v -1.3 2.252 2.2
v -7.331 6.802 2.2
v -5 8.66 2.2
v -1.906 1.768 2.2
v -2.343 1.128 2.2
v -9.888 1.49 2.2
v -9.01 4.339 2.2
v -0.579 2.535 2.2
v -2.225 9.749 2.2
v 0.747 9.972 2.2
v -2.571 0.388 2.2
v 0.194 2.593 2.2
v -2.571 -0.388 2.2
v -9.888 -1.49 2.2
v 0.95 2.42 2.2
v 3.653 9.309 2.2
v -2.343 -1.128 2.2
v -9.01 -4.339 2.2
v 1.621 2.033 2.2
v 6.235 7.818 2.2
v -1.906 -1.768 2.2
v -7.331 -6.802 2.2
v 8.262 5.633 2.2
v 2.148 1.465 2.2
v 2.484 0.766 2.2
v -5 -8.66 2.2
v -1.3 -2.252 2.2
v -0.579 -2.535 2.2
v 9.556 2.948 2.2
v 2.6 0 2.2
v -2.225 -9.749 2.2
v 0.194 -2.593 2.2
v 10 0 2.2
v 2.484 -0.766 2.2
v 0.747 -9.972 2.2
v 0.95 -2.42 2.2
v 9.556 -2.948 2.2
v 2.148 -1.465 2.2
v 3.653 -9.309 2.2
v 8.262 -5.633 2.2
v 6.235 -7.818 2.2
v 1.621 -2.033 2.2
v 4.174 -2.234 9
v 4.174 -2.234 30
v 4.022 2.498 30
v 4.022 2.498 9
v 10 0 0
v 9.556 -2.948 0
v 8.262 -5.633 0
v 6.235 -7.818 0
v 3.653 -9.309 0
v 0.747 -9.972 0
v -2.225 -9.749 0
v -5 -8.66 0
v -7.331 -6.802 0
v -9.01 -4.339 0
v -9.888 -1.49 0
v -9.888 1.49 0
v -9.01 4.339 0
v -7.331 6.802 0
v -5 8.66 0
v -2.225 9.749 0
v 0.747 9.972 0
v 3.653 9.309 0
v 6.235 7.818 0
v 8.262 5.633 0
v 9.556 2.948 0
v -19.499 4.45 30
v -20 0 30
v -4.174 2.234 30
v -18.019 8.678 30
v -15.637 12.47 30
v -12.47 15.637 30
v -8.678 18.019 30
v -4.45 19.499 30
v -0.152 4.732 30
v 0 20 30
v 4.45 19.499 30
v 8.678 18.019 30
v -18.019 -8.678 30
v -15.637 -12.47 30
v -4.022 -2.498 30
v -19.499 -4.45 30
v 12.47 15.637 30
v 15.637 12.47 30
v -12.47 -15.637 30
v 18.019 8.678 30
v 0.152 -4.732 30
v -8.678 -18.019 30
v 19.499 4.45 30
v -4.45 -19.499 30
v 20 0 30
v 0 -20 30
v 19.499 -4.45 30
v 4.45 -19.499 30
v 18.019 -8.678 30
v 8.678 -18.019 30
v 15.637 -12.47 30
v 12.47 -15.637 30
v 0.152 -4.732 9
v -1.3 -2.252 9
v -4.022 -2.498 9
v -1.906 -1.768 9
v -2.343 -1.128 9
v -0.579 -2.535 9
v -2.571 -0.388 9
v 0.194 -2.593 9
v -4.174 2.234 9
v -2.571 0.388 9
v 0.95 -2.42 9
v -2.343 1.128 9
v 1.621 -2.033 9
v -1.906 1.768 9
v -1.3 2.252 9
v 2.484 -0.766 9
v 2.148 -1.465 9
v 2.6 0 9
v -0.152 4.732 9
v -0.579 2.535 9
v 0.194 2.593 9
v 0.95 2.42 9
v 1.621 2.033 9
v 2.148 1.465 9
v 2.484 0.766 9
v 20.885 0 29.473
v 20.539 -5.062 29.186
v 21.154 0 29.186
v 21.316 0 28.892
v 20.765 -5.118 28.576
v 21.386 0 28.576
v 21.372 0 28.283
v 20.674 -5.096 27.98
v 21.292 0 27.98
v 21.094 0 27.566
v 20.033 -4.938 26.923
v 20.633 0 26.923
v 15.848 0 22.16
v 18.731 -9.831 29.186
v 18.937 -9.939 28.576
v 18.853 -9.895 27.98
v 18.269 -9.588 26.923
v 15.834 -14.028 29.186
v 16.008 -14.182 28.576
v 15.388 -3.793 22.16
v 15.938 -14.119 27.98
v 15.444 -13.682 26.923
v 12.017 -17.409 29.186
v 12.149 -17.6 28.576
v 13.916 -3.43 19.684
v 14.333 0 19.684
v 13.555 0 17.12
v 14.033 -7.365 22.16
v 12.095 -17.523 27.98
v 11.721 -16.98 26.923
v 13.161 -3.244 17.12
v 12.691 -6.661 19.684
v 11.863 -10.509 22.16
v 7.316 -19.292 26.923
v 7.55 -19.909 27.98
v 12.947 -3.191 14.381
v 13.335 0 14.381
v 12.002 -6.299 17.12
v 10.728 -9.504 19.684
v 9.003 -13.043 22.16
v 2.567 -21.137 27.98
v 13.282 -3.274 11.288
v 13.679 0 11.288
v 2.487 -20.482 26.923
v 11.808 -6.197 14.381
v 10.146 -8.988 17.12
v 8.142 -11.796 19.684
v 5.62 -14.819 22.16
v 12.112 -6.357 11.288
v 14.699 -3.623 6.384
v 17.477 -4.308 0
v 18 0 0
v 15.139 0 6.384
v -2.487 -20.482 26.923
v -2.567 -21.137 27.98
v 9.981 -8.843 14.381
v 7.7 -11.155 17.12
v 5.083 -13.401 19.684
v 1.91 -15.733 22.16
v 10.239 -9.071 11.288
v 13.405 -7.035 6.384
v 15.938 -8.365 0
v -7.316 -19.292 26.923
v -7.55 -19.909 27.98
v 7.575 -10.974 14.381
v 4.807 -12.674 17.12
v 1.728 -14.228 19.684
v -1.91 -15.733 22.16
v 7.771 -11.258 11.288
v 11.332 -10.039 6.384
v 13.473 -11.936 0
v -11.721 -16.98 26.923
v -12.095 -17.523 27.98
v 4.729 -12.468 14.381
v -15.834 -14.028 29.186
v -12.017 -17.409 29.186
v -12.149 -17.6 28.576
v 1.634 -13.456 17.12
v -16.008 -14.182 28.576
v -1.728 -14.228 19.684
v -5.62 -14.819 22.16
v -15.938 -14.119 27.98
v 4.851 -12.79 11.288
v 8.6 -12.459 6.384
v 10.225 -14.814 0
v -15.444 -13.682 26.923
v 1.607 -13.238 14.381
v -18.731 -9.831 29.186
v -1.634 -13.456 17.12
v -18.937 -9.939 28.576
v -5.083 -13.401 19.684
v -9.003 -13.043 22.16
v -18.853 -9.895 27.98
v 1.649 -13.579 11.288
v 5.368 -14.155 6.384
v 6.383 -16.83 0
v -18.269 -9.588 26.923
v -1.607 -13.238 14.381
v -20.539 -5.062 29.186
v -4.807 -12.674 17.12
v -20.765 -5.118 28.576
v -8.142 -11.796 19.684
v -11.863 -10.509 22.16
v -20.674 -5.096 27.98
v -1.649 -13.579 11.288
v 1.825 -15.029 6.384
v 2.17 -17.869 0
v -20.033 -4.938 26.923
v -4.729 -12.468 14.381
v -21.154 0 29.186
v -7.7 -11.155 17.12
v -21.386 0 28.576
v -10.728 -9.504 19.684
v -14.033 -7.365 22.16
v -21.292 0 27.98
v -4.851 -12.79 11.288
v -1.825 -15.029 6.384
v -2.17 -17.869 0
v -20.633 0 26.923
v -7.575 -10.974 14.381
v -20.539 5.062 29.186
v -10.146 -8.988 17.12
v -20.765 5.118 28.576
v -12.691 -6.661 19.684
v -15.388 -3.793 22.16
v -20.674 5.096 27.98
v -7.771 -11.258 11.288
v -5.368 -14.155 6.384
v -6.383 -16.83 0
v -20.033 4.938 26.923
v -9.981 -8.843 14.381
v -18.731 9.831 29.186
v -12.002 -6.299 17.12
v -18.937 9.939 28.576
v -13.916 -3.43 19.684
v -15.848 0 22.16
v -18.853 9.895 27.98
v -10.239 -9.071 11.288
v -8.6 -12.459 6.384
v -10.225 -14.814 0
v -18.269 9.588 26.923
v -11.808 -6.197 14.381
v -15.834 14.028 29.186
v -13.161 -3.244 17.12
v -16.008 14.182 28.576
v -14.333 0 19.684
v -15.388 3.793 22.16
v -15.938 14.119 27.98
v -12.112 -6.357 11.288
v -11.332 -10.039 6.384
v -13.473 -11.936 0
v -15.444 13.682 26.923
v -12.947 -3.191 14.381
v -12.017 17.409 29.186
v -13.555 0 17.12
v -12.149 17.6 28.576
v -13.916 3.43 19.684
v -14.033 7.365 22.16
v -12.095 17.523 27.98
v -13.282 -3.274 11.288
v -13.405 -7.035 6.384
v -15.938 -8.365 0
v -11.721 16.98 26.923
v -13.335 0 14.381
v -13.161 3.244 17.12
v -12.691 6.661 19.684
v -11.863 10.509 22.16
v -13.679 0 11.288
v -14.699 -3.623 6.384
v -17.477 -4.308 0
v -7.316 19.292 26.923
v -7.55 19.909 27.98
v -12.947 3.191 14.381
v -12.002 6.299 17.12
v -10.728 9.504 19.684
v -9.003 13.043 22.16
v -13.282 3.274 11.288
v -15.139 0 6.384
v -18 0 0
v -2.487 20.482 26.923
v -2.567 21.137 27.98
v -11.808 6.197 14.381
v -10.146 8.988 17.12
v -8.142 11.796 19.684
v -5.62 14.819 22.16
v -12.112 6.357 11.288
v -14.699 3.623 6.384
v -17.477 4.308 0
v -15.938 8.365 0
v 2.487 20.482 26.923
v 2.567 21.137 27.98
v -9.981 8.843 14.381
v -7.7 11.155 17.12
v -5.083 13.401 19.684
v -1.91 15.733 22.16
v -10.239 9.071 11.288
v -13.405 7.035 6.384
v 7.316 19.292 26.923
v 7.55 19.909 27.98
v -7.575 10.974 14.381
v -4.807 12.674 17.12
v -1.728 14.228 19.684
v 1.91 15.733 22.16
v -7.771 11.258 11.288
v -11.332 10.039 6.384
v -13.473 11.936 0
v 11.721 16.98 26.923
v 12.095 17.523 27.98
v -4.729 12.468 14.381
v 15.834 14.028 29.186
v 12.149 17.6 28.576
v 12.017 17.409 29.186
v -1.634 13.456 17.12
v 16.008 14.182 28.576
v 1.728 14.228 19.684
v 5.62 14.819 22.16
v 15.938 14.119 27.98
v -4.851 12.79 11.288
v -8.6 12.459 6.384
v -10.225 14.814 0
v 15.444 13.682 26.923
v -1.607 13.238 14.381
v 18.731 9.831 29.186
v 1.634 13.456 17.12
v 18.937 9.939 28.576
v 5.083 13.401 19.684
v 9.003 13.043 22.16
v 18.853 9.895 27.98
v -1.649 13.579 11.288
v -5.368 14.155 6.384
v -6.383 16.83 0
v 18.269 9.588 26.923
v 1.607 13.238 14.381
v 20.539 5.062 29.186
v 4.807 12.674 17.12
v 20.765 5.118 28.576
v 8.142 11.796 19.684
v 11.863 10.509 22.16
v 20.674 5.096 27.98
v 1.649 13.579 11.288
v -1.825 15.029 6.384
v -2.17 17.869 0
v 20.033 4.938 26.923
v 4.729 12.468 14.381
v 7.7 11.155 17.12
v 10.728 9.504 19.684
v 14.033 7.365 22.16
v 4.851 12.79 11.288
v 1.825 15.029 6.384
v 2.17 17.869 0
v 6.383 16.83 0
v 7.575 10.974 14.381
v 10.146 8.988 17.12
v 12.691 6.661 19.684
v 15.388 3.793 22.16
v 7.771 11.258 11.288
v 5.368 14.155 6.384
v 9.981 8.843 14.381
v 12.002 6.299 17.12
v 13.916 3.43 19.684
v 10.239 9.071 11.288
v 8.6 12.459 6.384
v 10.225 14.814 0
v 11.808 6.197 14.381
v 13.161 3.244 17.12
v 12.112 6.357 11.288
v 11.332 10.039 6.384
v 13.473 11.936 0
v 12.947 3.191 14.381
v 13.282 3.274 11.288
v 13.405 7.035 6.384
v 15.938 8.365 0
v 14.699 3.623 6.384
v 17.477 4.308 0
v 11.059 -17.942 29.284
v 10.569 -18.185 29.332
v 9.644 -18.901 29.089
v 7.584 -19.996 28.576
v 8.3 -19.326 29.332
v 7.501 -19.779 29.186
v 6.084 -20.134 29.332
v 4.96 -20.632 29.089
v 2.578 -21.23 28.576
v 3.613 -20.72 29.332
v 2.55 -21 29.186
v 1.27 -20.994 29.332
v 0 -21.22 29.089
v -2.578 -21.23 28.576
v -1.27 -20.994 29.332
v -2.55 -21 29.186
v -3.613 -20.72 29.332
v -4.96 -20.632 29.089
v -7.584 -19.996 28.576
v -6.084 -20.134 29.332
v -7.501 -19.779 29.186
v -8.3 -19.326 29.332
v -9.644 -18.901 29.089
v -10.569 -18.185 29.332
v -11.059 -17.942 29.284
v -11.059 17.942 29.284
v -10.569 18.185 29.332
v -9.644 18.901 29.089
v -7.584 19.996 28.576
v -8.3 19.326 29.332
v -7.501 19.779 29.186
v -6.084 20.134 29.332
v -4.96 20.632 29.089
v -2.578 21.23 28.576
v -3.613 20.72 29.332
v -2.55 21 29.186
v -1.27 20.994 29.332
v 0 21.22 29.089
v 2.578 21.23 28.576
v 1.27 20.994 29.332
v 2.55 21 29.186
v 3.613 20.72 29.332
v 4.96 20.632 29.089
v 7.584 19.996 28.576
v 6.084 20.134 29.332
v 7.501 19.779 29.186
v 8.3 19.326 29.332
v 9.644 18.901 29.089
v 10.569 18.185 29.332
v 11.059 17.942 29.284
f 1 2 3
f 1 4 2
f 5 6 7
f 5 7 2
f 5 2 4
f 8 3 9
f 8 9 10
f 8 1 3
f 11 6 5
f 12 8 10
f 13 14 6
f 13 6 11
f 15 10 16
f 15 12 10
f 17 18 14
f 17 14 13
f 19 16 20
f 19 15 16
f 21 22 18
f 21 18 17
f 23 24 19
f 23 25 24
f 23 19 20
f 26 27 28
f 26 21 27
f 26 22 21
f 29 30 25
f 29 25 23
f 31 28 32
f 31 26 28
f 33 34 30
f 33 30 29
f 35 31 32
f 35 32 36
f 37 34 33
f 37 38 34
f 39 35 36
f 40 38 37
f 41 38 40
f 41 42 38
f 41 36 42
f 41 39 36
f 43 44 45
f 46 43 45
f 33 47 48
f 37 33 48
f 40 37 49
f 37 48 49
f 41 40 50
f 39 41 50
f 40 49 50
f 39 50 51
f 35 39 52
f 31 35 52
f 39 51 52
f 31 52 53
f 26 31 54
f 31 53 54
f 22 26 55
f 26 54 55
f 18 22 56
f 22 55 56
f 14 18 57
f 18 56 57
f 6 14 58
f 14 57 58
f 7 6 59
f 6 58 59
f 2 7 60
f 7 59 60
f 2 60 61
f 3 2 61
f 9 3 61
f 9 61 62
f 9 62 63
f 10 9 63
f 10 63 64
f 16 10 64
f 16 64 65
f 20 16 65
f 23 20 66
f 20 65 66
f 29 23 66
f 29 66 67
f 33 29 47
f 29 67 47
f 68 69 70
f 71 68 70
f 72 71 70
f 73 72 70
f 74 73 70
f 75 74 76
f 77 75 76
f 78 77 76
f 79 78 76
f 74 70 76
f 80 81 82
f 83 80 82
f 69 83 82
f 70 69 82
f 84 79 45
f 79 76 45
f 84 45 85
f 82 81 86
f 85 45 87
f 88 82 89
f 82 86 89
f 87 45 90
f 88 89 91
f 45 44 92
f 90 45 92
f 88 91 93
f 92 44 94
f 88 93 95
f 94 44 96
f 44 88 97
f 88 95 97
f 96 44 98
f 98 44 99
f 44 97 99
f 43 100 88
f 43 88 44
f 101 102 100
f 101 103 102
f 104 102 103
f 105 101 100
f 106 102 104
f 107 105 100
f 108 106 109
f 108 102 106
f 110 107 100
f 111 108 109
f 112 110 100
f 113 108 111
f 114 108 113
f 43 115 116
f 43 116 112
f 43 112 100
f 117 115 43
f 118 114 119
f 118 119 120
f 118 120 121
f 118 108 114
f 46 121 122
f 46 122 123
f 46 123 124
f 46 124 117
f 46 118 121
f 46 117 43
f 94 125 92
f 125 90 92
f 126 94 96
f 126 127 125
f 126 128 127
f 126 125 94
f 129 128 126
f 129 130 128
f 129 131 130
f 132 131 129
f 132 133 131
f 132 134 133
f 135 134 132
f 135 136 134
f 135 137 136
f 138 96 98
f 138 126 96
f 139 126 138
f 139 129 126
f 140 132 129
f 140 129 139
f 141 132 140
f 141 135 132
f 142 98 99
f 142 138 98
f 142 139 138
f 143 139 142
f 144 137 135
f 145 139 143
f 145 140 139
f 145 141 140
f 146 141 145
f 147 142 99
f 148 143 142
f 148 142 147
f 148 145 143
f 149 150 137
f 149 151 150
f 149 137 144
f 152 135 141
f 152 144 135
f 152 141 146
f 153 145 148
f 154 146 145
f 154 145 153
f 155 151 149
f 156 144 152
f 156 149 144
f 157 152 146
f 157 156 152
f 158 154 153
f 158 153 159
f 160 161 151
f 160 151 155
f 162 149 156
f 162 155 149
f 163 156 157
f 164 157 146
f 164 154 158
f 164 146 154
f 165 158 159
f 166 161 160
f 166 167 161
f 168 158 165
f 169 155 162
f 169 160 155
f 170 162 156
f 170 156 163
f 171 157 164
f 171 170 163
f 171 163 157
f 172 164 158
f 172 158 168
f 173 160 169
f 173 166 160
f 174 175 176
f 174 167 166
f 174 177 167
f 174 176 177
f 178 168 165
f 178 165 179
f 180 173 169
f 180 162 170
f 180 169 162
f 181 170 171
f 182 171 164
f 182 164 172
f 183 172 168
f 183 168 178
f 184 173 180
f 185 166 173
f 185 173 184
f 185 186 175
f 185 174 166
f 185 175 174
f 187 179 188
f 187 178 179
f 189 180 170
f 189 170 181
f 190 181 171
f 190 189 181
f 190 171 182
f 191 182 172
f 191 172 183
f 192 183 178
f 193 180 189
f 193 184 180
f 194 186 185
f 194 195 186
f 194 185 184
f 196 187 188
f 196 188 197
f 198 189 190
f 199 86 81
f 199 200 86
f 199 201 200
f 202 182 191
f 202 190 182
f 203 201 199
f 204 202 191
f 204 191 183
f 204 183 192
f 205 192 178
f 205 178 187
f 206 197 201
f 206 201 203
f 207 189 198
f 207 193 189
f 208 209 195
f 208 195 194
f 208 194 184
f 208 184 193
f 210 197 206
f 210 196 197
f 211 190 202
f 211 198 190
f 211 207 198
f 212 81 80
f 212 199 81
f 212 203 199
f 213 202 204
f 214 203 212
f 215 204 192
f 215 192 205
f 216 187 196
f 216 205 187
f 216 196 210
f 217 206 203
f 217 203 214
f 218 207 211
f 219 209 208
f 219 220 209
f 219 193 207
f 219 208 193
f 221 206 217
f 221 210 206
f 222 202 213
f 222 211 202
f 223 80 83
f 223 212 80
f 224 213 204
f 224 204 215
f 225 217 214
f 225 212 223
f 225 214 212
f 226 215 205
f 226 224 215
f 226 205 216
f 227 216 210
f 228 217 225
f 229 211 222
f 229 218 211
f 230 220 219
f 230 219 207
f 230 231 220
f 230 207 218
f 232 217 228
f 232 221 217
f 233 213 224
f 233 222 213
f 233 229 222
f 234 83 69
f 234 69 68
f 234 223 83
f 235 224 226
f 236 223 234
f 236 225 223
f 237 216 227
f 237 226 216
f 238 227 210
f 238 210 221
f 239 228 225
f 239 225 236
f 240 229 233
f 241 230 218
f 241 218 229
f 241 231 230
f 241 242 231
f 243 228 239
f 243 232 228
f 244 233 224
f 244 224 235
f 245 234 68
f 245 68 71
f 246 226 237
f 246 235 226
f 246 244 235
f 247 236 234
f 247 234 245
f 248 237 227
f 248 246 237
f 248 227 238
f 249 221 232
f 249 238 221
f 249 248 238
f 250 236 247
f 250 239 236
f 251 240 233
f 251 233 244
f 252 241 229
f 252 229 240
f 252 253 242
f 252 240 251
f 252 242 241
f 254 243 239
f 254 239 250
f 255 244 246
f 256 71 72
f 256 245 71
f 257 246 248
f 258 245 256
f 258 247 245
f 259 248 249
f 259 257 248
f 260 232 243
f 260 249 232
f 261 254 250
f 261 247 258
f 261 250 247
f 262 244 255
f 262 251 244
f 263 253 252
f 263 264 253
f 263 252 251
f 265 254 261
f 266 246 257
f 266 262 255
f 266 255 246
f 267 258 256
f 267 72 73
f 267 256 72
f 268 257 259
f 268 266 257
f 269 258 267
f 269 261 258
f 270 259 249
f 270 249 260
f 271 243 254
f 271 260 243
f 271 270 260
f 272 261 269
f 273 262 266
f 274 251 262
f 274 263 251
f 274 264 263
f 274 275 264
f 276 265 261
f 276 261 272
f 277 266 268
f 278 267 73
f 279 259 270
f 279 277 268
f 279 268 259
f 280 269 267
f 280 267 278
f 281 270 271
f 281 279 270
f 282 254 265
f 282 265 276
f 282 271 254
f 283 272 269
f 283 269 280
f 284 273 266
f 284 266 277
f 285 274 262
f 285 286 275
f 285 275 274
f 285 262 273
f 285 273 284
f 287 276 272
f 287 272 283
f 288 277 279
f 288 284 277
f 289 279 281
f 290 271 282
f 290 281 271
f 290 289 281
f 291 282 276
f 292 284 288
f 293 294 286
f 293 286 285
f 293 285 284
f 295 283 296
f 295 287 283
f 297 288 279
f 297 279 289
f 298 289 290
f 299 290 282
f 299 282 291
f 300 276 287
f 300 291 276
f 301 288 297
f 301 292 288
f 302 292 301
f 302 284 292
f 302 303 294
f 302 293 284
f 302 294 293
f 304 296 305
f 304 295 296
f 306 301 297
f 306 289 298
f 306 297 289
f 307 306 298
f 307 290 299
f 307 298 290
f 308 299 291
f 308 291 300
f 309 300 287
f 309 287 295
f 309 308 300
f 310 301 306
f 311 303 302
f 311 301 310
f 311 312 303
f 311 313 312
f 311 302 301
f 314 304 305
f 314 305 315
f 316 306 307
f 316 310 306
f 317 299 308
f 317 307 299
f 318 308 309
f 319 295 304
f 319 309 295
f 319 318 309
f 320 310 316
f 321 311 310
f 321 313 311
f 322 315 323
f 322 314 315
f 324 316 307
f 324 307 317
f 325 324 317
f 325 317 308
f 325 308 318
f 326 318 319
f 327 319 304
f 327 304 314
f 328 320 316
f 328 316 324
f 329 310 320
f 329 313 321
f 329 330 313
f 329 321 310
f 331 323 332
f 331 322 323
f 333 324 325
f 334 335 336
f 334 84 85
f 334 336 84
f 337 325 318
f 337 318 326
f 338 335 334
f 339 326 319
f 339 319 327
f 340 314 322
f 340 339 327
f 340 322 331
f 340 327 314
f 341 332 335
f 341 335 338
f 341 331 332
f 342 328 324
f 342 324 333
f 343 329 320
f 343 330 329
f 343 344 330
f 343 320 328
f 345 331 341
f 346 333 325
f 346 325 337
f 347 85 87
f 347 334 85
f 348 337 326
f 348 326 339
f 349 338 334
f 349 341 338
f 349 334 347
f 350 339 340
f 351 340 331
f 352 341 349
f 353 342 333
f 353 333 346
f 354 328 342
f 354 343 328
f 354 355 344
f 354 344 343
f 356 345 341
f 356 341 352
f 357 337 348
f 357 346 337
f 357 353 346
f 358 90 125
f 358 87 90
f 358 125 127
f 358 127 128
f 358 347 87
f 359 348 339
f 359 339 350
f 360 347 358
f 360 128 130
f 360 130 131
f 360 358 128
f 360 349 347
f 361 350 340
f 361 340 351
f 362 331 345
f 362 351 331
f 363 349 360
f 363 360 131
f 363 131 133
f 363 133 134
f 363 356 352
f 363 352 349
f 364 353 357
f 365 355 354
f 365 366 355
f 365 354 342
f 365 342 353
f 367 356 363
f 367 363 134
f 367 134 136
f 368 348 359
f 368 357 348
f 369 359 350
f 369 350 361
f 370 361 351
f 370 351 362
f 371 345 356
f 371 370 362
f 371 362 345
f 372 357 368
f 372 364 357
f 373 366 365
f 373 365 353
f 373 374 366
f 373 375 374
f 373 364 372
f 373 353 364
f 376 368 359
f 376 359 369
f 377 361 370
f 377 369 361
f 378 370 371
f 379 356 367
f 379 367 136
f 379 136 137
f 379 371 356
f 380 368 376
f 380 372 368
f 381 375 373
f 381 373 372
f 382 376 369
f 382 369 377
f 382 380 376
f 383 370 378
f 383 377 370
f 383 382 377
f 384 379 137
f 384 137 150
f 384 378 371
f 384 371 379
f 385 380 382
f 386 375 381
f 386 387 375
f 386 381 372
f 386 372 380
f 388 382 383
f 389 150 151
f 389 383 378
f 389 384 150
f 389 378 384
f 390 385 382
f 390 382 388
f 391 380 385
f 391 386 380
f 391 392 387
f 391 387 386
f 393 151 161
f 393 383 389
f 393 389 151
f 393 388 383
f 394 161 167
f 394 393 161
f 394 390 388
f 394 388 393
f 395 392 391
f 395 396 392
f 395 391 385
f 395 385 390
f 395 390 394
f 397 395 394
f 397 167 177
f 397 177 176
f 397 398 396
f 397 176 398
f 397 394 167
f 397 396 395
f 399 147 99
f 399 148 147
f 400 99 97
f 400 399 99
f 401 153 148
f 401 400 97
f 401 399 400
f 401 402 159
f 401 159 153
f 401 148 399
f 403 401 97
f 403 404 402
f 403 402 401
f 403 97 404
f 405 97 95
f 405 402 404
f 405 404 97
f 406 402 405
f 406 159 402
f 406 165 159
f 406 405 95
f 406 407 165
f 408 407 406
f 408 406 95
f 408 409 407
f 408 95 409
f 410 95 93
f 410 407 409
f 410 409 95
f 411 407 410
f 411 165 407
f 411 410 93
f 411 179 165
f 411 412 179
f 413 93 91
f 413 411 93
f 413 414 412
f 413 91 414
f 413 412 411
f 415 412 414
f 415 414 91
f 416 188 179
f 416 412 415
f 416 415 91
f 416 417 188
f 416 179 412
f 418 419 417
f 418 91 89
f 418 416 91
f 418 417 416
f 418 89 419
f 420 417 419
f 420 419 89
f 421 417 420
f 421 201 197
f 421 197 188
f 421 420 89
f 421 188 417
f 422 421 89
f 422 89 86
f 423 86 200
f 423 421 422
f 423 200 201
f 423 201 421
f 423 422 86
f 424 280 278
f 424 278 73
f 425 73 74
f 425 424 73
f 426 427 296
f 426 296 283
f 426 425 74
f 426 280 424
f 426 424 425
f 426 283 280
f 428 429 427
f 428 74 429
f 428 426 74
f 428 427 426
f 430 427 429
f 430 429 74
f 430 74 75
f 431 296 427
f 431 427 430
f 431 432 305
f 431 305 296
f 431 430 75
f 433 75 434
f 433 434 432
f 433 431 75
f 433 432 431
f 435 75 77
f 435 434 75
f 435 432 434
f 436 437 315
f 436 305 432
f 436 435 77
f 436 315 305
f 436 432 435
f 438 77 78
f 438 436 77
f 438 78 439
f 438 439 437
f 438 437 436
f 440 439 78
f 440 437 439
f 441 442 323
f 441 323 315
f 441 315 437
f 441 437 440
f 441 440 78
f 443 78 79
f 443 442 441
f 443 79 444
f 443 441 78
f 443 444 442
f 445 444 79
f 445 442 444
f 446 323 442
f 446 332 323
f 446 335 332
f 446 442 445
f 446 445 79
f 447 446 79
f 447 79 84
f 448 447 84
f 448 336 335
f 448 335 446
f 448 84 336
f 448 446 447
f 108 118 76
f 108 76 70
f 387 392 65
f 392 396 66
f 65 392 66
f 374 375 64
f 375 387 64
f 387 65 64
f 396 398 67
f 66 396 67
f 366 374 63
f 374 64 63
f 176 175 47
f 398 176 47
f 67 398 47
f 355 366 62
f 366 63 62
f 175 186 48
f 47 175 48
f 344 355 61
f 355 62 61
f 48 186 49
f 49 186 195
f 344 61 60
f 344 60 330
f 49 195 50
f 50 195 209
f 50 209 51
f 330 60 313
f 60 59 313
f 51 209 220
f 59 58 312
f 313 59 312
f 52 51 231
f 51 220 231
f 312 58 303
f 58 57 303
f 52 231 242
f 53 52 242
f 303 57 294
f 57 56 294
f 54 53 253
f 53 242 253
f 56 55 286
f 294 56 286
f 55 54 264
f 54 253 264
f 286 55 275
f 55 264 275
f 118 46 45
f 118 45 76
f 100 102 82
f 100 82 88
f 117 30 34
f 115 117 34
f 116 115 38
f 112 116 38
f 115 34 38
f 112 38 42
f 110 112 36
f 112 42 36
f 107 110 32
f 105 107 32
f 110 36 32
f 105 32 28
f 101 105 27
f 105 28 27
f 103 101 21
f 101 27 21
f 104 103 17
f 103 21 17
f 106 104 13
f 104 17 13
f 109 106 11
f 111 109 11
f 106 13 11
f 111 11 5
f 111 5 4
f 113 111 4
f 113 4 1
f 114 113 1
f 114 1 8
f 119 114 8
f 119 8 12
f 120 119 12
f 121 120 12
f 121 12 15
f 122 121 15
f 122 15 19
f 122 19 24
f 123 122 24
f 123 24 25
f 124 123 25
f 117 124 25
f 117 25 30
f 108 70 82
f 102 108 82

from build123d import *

# Parameters (mm, degrees)
F2_R          = 10
F3_DEPTH      = 2.2
F4_R          = 2.6
F5_DEPTH      = 27.8010001
F8_DEPTH      = 4
F8_DEPTH_BACK = 25


with BuildPart() as f1:
    # F0 (on Front) → F1 (revolve)
    with BuildSketch(Plane.XZ):
        with BuildLine():
            Line((0, 30), (0, 0))
            Line((0, 0), (18, 0))
            add(Edge.make_bspline(
                [(20, 30), (23.3665107807, 28.5300366312), (15.8290646793, 23.4868524752), (12.3142279703, 15.9642343157), (13.8468699499, 8.2686705737), (18, 0)],
                knots=[0, 0, 0, 0, 0.2654633996, 0.5684844846, 1, 1, 1, 1], degree=3))
            Line((20, 30), (0, 30))
        make_face()
    revolve(axis=Axis((0, 0, 15), (0, 0, -1)))

    # F2 (on face) → F3 (cut)
    with BuildSketch(Plane(origin=(0, 0, 0), x_dir=(1, 0, 0), z_dir=(0, 0, -1))):
        Circle(F2_R)
    extrude(amount=-F3_DEPTH, mode=Mode.SUBTRACT)

    # F4 (on face) → F5 (cut, through all)
    with BuildSketch(Plane(origin=(0, 0, 2.2), x_dir=(1, 0, 0), z_dir=(0, 0, -1))):
        Circle(F4_R)
    extrude(amount=-F5_DEPTH, mode=Mode.SUBTRACT)

    # F7 (on offset) → F8 (cut, two sides)
    with BuildSketch(Plane.XY.offset(13)) as f8_sk:
        Polygon((4.0216239956, 2.4979739332), (-0.1524968863, 4.7318155113), (-4.174120882, 2.2338415781), (-4.0216239956, -2.4979739332), (0.1524968863, -4.7318155113), (4.174120882, -2.2338415781), align=None)
    extrude(amount=-F8_DEPTH, mode=Mode.SUBTRACT)
    extrude(f8_sk.sketch, amount=F8_DEPTH_BACK, mode=Mode.SUBTRACT)


solid = f1.part
